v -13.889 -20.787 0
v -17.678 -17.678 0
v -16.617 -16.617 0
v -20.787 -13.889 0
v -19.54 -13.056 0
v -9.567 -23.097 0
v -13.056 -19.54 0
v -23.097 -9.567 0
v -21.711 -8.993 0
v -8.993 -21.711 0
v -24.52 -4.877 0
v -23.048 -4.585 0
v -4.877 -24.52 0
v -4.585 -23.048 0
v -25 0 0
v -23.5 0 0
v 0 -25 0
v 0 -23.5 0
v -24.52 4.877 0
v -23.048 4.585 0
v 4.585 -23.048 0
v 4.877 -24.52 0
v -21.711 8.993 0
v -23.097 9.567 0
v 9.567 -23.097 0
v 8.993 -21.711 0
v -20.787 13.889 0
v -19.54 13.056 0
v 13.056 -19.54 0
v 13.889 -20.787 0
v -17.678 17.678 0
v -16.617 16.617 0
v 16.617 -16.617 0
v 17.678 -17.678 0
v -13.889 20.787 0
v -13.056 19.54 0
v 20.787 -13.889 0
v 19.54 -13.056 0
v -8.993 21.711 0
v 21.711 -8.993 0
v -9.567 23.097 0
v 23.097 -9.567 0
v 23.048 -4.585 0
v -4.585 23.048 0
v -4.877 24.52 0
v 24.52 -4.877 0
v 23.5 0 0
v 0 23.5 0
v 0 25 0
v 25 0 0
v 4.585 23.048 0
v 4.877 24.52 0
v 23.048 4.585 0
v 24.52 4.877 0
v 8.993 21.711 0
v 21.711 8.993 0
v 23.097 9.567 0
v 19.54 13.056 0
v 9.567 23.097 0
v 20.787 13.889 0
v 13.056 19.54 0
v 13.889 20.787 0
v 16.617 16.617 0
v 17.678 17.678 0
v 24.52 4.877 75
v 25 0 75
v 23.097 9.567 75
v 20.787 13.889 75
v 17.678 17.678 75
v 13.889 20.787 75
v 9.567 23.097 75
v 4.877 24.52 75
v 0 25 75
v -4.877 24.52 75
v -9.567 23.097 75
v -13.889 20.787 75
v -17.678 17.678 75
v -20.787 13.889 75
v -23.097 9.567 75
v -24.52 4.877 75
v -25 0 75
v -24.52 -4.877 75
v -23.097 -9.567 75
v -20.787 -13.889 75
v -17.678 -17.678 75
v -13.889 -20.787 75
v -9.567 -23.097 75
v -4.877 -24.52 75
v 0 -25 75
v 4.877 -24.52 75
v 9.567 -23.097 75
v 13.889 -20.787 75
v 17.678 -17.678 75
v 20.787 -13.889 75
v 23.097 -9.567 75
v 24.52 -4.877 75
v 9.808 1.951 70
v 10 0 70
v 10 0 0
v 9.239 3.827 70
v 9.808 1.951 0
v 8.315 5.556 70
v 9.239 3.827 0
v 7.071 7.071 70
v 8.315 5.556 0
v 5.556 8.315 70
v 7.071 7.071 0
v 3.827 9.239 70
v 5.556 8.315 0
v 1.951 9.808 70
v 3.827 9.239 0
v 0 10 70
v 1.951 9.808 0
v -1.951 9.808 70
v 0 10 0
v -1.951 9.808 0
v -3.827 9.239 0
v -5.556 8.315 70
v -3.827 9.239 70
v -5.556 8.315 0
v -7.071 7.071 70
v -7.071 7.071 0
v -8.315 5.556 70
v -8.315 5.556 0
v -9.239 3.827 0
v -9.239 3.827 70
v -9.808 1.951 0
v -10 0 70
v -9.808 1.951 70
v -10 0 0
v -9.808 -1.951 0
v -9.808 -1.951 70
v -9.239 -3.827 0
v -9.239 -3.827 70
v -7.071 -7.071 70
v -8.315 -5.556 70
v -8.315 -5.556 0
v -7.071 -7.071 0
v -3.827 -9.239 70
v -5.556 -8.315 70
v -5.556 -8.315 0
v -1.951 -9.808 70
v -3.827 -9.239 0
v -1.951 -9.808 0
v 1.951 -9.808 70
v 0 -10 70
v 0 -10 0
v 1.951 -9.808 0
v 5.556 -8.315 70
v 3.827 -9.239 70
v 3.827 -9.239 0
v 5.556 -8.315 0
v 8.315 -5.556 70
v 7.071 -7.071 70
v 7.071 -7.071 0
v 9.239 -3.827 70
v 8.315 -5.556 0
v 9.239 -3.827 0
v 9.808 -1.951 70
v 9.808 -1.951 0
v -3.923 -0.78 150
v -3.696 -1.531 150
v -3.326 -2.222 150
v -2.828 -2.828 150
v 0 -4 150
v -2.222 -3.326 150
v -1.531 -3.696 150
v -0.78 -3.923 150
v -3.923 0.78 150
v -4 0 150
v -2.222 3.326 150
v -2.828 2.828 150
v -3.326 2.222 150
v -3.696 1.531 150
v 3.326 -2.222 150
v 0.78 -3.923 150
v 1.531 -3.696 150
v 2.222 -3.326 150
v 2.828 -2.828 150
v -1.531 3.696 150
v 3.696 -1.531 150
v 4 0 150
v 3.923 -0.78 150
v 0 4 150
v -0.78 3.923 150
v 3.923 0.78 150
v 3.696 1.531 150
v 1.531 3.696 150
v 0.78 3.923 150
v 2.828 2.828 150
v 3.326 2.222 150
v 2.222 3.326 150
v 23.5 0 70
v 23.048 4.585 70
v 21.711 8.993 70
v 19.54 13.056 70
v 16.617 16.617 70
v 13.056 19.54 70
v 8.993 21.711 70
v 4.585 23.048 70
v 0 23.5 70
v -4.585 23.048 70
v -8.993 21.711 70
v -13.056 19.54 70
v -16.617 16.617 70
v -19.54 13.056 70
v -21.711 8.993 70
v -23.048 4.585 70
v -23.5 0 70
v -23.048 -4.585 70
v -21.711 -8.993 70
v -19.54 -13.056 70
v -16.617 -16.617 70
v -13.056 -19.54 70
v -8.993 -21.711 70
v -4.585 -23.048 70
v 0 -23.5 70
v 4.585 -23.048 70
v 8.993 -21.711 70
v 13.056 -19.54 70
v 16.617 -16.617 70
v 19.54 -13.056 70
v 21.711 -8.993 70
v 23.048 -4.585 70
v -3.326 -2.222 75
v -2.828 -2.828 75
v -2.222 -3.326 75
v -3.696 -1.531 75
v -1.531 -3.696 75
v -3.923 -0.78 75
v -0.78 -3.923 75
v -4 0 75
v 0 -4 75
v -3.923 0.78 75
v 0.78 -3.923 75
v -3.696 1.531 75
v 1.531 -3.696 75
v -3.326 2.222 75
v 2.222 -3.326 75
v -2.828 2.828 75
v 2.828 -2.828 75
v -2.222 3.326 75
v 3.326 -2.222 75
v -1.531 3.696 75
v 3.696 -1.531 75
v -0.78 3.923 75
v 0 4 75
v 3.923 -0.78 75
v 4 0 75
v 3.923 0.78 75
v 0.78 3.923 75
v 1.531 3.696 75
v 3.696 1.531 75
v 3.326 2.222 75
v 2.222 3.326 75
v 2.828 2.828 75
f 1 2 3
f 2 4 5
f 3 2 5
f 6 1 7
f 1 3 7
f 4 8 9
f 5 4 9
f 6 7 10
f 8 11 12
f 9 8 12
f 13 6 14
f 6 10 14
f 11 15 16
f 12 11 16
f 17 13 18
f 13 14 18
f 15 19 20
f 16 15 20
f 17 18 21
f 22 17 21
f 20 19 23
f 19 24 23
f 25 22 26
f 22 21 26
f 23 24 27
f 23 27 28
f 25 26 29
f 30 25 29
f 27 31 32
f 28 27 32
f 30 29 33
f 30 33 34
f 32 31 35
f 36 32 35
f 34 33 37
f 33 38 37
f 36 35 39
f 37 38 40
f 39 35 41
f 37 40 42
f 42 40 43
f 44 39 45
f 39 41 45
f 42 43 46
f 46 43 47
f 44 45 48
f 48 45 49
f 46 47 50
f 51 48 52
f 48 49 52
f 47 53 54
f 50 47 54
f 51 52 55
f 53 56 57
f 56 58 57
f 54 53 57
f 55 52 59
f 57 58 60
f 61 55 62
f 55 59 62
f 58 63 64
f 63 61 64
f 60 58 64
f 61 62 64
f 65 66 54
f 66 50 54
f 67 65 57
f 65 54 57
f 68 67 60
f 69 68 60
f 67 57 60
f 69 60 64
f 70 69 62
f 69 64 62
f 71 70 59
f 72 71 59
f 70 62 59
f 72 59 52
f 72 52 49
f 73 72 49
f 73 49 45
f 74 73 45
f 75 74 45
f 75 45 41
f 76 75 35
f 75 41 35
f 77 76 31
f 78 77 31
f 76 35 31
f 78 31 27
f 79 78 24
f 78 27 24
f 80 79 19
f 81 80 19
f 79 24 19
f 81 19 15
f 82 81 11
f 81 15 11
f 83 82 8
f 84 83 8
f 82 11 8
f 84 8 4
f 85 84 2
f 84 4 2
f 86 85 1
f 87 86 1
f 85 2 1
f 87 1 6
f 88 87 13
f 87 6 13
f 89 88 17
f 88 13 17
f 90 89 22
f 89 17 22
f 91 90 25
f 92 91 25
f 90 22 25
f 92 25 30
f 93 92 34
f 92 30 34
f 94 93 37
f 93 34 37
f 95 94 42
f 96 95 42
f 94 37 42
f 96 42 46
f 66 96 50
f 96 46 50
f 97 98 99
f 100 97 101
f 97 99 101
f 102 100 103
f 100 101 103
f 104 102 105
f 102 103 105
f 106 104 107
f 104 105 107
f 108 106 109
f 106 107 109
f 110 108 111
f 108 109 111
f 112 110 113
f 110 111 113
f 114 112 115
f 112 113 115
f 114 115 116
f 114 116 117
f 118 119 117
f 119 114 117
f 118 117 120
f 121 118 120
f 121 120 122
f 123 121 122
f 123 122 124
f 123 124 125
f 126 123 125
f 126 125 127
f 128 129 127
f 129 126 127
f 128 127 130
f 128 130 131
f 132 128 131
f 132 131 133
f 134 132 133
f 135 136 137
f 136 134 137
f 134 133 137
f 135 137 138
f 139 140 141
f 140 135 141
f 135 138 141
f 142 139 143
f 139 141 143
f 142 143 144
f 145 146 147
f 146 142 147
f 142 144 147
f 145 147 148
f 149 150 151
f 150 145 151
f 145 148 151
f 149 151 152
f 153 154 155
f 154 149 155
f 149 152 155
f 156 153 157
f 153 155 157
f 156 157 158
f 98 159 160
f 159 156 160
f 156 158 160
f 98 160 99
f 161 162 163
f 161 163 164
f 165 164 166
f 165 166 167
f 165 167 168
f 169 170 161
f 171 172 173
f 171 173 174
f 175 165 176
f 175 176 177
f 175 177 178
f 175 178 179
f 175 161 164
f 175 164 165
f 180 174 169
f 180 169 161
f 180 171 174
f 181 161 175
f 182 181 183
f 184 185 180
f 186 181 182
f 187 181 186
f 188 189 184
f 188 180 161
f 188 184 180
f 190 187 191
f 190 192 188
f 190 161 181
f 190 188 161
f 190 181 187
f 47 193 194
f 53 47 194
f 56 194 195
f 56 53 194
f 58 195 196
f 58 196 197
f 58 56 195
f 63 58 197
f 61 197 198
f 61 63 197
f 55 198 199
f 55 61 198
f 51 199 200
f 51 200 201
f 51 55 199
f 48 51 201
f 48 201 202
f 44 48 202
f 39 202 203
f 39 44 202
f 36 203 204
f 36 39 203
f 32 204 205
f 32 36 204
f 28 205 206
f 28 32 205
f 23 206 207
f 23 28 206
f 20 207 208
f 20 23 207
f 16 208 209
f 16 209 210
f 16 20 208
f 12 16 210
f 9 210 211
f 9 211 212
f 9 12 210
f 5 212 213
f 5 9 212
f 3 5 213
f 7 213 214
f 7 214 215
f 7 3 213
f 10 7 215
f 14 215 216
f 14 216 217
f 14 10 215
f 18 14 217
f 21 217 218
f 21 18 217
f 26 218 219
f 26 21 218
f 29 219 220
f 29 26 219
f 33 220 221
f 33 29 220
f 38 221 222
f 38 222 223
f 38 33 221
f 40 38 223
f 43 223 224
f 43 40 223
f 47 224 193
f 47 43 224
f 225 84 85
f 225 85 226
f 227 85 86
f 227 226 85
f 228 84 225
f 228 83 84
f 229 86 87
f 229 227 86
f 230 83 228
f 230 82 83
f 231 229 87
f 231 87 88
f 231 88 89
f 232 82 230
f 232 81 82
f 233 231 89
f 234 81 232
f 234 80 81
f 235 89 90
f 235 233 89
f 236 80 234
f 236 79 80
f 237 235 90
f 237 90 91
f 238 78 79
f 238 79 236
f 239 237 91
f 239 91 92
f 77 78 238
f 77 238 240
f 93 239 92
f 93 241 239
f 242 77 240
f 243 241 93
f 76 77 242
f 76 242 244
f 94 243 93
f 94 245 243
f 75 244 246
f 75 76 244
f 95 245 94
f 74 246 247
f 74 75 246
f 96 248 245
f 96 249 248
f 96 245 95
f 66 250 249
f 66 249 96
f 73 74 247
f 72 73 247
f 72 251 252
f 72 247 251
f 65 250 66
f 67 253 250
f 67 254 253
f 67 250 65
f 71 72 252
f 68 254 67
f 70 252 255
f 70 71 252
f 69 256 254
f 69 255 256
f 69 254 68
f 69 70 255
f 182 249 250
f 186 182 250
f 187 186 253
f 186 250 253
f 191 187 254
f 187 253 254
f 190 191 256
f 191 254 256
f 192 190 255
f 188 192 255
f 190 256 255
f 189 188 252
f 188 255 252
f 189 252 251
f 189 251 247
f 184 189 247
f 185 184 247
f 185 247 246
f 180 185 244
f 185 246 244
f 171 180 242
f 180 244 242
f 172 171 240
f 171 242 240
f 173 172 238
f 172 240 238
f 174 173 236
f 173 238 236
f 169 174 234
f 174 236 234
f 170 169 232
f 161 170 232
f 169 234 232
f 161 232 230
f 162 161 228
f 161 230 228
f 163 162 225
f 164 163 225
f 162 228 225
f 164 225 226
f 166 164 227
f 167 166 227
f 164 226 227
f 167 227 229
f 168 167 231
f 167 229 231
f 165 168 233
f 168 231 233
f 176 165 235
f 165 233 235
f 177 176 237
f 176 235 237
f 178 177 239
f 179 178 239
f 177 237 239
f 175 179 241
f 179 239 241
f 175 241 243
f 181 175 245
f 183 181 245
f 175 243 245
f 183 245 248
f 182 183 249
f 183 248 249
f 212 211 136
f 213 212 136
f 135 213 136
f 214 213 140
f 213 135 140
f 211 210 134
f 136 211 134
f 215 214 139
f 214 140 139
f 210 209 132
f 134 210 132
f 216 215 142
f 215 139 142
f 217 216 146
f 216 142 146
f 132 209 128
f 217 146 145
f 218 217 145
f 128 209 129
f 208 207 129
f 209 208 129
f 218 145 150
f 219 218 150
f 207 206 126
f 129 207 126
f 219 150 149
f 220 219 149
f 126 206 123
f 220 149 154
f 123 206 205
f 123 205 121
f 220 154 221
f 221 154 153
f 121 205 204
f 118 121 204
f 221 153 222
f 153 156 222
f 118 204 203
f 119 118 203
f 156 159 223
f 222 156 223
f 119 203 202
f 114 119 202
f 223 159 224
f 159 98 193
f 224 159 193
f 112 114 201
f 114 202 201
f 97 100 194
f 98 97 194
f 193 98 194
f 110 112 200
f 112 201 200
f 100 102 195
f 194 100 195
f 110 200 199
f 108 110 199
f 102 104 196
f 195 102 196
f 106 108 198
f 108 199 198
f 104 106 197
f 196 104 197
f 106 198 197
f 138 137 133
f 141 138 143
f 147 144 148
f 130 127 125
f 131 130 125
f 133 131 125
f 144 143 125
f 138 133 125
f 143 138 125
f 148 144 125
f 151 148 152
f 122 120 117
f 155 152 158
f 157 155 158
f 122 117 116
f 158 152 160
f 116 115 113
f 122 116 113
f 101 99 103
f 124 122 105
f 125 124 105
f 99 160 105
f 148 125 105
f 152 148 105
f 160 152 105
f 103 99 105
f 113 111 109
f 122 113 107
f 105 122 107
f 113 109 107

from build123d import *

# Parameters (mm, degrees)
F0_R     = 25
F0_R_2   = 23.5
F1_DEPTH = 70
F2_R     = 25
F3_DEPTH = 5
F4_R     = 4
F5_DEPTH = 75
F0_R_3   = 10
F6_DEPTH = 75


with BuildPart() as f1:
    # F0 (on Top) → F1 (new body)
    with BuildSketch(Plane.XY):
        Circle(F0_R)
        Circle(F0_R_2, mode=Mode.SUBTRACT)
    extrude(amount=F1_DEPTH)

    # F2 (on face) → F3 (join)
    with BuildSketch(Plane.XY.offset(70)):
        Circle(F2_R)
    extrude(amount=F3_DEPTH)

    # F4 (on face) → F5 (join)
    with BuildSketch(Plane.XY.offset(75)):
        Circle(F4_R)
    extrude(amount=F5_DEPTH)

    # F0 (on Top) → F6 (join)
    with BuildSketch(Plane.XY):
        Circle(F0_R_3)
    extrude(amount=F6_DEPTH)


solid = f1.part
